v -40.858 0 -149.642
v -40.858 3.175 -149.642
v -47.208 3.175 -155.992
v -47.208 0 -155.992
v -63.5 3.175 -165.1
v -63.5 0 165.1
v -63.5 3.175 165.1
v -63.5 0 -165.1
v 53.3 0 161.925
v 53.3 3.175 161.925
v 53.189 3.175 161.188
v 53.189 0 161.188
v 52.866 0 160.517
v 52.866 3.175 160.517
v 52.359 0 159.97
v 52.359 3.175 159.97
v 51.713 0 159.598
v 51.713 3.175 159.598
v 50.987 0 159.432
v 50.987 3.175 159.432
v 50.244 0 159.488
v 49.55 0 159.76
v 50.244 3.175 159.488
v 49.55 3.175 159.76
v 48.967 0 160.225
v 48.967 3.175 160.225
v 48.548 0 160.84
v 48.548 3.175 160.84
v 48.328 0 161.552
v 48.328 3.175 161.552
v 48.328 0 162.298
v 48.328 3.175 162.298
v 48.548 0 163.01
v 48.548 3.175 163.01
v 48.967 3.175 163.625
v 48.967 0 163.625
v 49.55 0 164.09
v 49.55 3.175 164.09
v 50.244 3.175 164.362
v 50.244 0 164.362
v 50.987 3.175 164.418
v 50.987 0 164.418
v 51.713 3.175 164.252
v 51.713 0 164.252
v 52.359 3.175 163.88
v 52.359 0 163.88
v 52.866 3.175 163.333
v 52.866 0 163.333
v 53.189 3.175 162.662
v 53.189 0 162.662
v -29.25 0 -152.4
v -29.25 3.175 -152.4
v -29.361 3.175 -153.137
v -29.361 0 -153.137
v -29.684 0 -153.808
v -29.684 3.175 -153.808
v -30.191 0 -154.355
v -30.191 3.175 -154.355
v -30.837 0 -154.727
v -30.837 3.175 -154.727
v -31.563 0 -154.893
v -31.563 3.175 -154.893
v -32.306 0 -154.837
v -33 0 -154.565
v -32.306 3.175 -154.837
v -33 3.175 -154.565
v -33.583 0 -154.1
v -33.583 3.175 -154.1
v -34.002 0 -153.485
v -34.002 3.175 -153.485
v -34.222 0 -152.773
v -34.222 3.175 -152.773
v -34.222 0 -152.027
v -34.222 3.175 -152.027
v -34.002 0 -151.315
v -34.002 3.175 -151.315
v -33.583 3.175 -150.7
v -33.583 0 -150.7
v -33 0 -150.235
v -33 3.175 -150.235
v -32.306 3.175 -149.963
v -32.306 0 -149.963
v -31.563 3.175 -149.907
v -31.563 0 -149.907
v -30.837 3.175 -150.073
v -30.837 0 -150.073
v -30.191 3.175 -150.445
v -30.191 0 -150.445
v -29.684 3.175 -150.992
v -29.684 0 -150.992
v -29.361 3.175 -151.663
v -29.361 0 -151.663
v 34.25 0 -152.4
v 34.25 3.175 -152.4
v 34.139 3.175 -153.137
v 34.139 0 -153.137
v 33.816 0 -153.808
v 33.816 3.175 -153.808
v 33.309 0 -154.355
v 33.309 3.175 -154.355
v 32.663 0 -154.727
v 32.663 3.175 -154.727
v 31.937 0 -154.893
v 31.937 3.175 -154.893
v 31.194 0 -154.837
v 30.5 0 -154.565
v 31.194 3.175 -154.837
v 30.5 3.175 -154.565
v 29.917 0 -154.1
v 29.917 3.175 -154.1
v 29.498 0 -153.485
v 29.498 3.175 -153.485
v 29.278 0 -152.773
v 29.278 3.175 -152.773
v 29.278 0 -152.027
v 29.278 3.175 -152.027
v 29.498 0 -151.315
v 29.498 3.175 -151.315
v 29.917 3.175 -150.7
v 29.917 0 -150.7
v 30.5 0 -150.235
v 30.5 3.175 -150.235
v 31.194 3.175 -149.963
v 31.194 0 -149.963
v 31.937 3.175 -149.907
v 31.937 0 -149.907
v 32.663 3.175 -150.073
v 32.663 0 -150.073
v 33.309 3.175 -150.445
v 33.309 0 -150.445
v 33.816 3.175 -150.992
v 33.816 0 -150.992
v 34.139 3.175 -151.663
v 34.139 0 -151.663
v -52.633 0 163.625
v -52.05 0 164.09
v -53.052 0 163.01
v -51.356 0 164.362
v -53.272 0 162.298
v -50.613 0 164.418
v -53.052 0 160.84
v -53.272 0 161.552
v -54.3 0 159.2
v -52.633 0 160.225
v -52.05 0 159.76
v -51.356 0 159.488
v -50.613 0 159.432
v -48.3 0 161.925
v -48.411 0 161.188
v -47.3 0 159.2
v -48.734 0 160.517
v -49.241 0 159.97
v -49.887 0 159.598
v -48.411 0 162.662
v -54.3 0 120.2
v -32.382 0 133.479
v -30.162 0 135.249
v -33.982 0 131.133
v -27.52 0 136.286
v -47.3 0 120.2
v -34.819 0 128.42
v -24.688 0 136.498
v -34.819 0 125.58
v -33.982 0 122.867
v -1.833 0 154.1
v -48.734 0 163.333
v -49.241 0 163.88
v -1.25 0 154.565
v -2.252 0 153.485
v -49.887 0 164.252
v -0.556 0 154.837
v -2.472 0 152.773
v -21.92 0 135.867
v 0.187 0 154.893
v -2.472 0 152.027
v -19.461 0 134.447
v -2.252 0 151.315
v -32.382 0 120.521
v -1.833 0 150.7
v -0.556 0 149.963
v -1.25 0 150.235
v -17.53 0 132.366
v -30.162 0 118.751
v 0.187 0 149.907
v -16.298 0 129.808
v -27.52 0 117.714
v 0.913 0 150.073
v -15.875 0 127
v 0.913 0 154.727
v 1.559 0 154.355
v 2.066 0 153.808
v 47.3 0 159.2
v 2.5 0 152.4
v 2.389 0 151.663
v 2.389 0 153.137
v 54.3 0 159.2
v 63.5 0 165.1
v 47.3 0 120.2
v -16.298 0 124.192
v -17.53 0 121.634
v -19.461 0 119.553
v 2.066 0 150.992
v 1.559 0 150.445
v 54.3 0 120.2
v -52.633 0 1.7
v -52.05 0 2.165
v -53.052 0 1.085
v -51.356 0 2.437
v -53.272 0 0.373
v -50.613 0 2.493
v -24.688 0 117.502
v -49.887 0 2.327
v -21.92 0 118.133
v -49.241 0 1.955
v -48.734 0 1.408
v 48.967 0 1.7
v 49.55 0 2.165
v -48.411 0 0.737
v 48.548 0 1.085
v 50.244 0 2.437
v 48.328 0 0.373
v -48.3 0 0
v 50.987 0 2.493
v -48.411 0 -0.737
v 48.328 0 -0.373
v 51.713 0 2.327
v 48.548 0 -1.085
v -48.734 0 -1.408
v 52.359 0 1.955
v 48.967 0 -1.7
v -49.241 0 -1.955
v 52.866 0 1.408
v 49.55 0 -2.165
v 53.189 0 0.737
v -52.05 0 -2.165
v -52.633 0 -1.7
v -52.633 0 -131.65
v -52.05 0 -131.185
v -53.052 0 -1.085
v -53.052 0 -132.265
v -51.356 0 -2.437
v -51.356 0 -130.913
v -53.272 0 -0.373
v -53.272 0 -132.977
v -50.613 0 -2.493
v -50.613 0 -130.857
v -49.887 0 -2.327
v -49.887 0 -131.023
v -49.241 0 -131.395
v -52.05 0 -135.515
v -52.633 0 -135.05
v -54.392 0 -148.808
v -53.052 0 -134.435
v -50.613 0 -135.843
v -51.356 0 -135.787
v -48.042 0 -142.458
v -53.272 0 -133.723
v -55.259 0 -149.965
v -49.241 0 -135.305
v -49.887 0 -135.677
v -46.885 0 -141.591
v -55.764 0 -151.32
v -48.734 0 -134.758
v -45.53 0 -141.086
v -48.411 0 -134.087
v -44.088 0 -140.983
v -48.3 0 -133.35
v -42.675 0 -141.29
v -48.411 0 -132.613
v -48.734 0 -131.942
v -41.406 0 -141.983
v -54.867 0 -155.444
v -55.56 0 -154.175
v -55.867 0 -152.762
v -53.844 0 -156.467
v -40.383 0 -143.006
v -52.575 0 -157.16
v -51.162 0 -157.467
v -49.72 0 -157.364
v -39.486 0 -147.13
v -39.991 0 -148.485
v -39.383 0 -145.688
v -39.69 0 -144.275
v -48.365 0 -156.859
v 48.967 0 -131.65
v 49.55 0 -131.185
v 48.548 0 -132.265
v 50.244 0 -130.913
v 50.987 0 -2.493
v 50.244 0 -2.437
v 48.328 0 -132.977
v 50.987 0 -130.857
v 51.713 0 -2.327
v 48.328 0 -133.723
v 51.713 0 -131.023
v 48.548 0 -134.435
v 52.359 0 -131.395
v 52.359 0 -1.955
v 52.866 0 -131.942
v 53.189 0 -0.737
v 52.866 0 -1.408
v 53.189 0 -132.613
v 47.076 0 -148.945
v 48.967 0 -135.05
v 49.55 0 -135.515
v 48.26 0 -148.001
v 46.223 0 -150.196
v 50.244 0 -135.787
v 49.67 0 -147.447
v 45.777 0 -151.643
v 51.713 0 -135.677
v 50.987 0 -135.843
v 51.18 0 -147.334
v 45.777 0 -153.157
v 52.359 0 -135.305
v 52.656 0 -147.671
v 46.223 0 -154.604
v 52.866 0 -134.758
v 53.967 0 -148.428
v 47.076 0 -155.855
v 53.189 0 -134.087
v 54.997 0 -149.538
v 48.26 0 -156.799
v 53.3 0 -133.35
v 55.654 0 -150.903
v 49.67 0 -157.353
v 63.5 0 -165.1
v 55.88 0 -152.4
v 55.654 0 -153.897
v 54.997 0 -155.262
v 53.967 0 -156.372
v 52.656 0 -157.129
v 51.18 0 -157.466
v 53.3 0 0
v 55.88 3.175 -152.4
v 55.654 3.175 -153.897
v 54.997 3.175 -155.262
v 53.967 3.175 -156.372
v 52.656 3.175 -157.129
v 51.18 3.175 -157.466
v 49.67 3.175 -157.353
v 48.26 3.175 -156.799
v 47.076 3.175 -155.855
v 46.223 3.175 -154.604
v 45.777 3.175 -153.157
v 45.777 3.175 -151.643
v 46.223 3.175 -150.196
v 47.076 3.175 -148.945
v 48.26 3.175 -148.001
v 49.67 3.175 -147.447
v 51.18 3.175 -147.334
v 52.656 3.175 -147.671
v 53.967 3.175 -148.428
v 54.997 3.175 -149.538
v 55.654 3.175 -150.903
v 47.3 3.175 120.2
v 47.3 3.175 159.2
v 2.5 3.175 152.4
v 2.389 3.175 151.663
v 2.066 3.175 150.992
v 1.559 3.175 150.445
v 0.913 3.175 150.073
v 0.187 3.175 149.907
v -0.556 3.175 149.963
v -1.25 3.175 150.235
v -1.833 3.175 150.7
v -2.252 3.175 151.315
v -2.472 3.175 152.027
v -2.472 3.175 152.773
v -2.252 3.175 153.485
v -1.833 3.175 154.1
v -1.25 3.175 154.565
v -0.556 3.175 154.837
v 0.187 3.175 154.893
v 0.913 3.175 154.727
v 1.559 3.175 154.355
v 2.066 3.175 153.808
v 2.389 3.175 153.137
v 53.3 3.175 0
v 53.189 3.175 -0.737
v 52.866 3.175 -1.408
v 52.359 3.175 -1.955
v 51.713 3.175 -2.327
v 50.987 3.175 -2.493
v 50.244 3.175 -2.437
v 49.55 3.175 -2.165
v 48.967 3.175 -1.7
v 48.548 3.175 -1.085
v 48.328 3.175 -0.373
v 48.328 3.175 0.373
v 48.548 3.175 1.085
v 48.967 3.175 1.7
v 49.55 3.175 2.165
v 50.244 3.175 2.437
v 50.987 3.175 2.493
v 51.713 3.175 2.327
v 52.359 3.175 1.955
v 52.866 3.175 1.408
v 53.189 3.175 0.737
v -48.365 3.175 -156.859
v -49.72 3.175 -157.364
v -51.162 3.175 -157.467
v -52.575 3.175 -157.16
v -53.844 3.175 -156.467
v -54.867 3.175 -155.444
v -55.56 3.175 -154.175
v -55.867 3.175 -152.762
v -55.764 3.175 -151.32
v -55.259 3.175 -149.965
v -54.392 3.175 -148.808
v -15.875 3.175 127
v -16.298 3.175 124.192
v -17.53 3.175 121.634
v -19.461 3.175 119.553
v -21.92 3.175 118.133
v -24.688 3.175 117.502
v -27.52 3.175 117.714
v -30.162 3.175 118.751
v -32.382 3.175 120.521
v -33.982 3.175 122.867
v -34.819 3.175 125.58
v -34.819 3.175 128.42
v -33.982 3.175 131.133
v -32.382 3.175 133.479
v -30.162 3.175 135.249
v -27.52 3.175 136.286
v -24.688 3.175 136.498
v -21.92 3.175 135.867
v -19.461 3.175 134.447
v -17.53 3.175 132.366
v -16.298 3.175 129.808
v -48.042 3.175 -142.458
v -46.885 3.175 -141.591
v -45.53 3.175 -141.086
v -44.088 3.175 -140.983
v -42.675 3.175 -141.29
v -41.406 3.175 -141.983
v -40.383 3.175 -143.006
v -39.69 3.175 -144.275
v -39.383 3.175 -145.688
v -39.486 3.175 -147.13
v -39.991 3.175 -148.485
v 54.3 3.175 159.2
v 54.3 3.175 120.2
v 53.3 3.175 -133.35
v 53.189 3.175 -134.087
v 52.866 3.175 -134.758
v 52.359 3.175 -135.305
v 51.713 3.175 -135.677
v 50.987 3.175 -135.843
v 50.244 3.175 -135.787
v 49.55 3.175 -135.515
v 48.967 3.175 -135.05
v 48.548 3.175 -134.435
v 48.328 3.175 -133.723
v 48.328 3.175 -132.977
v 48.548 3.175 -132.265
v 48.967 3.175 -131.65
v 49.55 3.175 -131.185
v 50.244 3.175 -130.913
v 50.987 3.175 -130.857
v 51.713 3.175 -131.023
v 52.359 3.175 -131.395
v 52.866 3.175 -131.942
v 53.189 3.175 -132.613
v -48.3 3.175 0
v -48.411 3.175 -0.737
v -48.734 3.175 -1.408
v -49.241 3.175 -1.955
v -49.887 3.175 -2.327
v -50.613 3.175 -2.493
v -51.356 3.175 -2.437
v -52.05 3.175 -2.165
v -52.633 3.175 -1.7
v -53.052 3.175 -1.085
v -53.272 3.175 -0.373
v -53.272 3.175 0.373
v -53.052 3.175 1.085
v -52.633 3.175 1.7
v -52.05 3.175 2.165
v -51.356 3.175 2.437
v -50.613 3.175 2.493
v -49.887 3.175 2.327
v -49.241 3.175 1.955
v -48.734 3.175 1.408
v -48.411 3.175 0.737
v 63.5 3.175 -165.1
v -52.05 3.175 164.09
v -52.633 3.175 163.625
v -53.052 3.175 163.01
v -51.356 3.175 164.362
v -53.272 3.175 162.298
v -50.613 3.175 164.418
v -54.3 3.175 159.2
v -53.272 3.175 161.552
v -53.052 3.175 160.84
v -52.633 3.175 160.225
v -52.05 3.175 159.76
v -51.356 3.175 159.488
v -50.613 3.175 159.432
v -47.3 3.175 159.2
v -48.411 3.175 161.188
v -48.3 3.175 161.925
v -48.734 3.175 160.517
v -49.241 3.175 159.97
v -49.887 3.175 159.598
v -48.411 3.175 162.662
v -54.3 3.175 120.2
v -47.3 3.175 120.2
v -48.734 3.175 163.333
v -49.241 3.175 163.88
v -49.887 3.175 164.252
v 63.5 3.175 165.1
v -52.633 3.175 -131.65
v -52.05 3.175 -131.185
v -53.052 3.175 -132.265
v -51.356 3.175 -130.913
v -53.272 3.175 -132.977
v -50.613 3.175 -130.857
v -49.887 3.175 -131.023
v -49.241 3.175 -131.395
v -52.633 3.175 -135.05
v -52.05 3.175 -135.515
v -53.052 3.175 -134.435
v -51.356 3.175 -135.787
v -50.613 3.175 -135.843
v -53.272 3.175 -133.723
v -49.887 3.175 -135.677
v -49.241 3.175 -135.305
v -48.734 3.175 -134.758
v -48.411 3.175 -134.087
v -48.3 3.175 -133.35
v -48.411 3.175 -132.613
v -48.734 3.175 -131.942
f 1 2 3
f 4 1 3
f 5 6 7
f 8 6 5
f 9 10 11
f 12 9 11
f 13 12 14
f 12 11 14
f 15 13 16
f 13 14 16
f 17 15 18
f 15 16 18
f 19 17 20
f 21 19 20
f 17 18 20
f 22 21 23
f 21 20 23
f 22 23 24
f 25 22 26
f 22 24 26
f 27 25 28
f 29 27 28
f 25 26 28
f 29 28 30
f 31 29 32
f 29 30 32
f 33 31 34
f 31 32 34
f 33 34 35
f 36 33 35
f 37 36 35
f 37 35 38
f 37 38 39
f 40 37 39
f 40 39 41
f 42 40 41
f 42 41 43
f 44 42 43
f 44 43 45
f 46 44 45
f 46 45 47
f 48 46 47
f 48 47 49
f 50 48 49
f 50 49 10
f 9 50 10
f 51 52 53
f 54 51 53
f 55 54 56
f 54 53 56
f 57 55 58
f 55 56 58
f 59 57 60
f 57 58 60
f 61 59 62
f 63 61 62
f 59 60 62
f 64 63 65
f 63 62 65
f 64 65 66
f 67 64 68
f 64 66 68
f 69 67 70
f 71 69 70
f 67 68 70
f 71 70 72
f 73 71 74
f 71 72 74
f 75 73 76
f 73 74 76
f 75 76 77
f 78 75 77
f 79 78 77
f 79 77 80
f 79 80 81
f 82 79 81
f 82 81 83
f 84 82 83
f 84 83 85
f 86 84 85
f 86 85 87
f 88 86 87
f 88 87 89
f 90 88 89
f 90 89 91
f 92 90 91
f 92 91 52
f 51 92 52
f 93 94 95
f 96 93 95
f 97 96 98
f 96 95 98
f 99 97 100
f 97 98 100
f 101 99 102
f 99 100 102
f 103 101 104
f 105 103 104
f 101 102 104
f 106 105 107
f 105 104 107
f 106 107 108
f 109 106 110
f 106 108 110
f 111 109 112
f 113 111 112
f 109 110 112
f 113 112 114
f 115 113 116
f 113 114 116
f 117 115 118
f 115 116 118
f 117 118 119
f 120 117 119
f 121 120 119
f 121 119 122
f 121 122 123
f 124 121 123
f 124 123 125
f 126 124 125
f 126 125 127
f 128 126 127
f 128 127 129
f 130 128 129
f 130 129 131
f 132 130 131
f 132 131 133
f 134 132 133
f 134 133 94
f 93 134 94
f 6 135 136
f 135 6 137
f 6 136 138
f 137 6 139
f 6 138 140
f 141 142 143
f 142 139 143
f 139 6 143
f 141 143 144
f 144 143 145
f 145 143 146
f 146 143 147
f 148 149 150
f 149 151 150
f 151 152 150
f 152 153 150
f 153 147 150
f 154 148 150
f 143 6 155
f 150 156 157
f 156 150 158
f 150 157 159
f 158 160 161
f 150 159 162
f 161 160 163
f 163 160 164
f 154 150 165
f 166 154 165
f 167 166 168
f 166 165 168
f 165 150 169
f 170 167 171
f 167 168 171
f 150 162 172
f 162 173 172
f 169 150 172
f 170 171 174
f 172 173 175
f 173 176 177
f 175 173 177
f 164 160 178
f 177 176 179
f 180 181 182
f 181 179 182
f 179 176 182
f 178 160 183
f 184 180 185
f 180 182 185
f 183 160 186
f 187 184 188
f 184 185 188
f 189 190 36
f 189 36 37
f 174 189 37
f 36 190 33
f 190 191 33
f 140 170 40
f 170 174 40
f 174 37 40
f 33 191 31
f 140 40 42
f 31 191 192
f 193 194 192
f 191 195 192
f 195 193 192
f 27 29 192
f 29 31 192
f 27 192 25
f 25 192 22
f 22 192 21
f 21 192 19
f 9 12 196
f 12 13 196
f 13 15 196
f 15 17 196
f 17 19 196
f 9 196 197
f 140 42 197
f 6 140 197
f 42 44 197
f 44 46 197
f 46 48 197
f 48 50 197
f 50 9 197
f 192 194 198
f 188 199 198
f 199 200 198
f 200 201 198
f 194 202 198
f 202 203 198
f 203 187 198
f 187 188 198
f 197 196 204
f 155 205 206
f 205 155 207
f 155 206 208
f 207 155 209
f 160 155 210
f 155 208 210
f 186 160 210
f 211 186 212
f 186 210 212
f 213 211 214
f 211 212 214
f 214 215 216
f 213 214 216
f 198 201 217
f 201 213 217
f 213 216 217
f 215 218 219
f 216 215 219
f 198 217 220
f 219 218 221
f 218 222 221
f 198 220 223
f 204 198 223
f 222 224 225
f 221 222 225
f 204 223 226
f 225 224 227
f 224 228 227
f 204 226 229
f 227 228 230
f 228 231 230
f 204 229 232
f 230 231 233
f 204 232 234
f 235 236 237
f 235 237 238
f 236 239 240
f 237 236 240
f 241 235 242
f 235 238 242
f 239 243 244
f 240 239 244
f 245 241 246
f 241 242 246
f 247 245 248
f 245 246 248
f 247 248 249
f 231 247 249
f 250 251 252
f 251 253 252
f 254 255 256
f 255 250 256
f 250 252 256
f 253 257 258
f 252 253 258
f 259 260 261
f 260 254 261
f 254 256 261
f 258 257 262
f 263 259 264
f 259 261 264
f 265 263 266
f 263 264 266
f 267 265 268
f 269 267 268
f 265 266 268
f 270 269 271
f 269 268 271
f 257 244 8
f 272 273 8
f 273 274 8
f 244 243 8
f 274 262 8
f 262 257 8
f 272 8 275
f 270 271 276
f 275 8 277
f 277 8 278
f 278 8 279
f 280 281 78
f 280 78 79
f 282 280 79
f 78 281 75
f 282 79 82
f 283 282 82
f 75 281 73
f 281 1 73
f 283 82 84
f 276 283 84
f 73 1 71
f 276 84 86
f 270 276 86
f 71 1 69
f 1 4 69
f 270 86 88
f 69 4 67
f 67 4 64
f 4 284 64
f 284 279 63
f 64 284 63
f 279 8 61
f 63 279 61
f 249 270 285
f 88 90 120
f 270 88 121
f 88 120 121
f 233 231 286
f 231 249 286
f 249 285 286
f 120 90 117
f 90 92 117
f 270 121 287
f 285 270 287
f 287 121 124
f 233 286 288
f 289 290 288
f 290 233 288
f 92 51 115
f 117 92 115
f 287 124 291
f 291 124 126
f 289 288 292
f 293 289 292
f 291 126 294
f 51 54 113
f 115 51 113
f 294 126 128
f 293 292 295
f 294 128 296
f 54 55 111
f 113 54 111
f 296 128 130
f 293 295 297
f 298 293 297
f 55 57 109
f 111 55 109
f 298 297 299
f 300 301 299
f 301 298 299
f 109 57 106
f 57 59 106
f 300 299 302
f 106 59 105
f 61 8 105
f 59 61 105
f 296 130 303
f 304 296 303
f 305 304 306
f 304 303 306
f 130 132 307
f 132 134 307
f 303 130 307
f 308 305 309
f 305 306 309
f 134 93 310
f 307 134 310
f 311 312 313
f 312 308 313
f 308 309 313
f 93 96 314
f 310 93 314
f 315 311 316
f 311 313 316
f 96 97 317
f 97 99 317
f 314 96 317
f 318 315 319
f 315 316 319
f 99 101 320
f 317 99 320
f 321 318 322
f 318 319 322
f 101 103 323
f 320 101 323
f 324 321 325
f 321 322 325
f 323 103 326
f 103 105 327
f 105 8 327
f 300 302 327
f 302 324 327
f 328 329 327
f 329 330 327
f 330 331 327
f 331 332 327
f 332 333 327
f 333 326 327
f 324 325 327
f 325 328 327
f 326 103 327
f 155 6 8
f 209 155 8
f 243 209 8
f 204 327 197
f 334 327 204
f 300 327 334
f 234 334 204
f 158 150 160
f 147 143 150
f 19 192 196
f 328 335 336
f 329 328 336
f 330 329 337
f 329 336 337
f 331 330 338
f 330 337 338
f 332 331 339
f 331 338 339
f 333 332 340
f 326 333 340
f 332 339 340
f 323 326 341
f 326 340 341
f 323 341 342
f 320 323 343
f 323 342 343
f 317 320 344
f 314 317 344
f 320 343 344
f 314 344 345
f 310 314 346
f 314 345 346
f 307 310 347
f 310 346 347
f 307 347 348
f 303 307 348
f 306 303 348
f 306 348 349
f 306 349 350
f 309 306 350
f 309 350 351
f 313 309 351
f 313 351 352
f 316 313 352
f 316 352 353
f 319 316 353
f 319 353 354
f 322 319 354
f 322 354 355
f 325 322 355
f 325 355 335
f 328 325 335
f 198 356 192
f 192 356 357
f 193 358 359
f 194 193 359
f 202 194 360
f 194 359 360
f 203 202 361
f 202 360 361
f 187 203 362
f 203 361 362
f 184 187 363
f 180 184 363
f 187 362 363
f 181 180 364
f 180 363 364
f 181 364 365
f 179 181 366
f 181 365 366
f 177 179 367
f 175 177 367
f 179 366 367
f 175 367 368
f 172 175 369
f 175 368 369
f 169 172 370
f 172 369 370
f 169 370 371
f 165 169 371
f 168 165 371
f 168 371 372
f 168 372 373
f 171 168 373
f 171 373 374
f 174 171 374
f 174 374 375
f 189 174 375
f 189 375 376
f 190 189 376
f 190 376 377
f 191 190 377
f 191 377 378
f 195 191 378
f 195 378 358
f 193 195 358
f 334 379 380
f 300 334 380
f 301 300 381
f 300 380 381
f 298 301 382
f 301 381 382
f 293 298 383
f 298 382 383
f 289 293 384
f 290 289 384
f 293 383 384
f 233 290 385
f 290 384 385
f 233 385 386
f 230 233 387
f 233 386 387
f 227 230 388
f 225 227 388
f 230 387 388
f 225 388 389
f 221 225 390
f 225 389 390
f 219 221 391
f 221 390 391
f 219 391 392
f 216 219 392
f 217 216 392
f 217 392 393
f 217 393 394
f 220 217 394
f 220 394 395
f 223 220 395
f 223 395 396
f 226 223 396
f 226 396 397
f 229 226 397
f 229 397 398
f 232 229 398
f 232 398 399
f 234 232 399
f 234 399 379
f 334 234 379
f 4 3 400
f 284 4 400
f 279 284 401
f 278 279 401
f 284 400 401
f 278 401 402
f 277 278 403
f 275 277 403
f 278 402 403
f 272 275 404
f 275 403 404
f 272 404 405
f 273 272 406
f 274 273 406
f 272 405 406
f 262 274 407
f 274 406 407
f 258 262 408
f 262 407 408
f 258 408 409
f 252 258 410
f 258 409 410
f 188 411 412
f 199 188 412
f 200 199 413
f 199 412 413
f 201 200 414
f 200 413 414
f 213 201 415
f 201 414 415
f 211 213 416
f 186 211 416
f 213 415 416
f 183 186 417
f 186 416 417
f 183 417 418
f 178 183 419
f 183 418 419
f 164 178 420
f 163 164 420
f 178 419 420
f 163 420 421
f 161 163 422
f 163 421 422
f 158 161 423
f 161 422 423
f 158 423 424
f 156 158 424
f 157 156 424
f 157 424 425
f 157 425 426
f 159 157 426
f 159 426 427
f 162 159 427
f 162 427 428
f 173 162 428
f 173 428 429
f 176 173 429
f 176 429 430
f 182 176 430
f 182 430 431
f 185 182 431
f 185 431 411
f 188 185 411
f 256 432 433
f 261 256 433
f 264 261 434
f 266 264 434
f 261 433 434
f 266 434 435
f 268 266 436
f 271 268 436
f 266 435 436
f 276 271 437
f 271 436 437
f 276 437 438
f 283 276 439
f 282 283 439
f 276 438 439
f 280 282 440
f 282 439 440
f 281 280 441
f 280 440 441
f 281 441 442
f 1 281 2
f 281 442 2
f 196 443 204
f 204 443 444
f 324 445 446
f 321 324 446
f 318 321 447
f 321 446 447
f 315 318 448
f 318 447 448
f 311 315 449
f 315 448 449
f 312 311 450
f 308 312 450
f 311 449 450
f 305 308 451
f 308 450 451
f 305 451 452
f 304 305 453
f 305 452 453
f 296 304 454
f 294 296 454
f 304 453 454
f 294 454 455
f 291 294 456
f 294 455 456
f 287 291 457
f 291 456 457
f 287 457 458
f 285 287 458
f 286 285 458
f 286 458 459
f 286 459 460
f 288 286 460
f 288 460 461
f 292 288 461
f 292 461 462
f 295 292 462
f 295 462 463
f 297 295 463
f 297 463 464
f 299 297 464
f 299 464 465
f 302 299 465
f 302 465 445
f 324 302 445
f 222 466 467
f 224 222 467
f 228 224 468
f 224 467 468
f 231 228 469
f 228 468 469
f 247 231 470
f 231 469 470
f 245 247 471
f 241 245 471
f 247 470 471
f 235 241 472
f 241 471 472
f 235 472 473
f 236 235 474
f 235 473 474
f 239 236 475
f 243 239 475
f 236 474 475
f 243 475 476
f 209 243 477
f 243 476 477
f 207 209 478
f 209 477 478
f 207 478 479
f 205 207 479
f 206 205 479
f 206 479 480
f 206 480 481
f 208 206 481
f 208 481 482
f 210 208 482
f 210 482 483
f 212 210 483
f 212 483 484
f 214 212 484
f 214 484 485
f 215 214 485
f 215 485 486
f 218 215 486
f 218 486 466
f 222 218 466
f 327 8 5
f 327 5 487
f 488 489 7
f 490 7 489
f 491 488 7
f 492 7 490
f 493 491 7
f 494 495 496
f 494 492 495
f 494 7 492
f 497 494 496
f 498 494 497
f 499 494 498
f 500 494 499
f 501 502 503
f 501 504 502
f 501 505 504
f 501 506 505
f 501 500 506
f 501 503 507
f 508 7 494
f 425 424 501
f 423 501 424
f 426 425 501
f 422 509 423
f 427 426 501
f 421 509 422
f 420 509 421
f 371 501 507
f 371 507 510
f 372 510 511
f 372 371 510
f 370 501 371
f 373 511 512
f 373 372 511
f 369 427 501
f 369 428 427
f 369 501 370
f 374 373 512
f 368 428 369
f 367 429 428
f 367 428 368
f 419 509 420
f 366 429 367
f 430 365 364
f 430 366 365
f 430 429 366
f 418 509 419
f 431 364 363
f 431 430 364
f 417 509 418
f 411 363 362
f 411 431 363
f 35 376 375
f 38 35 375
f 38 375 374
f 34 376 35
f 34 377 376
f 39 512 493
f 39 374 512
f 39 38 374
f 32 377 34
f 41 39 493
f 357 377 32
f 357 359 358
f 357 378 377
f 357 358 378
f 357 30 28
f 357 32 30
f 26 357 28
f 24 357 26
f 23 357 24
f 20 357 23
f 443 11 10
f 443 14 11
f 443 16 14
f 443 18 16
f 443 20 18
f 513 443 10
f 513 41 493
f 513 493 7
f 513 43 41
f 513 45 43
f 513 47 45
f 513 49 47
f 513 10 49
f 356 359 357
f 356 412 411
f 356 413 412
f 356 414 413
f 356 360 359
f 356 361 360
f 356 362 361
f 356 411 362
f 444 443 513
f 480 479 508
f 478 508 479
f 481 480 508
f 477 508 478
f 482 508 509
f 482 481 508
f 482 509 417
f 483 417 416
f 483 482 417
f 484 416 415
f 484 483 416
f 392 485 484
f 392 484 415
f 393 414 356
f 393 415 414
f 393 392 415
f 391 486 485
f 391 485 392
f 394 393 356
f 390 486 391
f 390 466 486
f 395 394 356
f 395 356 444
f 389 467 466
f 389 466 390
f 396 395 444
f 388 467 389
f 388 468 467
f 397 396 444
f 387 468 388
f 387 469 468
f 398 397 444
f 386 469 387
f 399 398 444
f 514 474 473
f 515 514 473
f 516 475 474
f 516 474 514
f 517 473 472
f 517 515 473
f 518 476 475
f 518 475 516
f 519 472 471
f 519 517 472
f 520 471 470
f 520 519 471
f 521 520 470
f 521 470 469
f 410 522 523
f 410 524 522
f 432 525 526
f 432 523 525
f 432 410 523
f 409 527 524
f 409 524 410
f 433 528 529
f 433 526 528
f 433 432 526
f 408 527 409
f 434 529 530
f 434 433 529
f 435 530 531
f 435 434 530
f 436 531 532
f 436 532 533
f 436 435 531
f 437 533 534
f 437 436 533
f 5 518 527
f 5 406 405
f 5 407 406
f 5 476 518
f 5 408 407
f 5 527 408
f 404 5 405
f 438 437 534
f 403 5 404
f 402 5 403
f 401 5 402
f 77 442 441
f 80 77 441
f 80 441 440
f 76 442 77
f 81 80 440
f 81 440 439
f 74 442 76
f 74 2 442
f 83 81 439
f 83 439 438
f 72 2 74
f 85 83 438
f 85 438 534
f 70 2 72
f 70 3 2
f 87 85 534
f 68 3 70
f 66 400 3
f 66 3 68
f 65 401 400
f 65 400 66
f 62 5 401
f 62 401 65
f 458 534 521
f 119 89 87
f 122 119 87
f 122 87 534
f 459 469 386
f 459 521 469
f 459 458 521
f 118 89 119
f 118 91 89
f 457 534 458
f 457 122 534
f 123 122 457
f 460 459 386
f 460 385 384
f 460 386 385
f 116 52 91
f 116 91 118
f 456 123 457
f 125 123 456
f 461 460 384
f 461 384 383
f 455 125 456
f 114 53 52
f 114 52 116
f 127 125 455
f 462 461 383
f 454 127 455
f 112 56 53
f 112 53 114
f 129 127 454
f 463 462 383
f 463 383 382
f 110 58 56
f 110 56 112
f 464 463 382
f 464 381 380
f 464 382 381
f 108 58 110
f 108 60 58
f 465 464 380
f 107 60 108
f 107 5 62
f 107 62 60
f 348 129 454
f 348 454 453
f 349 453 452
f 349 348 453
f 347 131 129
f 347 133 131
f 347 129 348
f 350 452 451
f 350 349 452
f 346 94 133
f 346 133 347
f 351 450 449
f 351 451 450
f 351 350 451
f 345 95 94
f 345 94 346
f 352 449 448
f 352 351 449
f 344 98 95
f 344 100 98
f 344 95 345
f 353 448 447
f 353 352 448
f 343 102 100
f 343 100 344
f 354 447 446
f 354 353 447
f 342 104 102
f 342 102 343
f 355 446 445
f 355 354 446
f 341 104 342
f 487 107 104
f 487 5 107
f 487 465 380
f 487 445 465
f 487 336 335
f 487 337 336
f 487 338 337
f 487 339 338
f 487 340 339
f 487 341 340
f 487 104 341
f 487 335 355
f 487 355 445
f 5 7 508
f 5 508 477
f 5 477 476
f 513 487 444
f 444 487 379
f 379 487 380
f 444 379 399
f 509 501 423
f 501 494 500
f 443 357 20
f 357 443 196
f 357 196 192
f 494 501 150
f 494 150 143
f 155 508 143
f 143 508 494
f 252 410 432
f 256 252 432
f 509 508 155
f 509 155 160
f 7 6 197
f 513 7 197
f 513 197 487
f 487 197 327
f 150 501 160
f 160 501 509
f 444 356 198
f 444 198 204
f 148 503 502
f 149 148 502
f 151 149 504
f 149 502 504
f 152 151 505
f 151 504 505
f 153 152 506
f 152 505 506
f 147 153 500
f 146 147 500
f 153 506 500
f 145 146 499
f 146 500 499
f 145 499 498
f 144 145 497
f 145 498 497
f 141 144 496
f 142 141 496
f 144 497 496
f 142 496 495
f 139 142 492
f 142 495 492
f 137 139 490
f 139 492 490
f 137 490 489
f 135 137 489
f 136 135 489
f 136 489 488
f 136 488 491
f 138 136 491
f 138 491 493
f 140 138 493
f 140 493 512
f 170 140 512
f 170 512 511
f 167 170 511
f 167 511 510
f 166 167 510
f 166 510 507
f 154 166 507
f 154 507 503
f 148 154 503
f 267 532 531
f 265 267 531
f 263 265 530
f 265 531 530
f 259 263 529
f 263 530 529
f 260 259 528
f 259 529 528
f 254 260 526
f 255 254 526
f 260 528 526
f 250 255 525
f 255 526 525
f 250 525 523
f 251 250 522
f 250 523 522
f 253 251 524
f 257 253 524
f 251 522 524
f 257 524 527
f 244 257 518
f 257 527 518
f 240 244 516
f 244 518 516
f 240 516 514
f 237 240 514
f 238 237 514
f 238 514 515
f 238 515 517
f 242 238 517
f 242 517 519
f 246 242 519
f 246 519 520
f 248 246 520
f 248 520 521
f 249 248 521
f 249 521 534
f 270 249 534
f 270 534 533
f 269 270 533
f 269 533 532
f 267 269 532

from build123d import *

# Parameters (mm, degrees)
SKETCH1_W           = 127
SKETCH1_H           = 330.2
BOSS_EXTRUDE1_DEPTH = 3.175
SKETCH2_R           = 2.5
SKETCH2_R_2         = 5.08
CUT_EXTRUDE1_DEPTH  = 25.4
SKETCH3_W           = 7
SKETCH3_H           = 39
SKETCH3_R           = 9.525
CUT_EXTRUDE2_DEPTH  = 25.4


with BuildPart() as part:
    # Sketch1 → Boss-Extrude1 (new body)
    with BuildSketch(Plane(origin=(0, 0, 0), x_dir=(1, 0, 0), z_dir=(0, 1, 0))):
        Rectangle(SKETCH1_W, SKETCH1_H)
    extrude(amount=BOSS_EXTRUDE1_DEPTH)

    # Sketch2 → Cut-Extrude1 (cut)
    # profile 1 of 14: a face of its own
    with BuildSketch(Plane(origin=(0, 3.175, 0), x_dir=(1, 0, 0), z_dir=(0, 1, 0))):
        with BuildLine():
            Line((-47.207897552, 155.992102448), (-40.857897552, 149.642102448))
            ThreePointArc((-40.857897552, 149.642102448), (-40.857897552, 142.457897552), (-48.042102448, 142.457897552))
            Line((-48.042102448, 142.457897552), (-54.392102448, 148.807897552))
            ThreePointArc((-54.392102448, 148.807897552), (-54.392102448, 155.992102448), (-47.207897552, 155.992102448))
        make_face()
        with Locations((-44.45, 146.05)):
            Circle(SKETCH2_R, mode=Mode.SUBTRACT)
        with Locations((-50.8, 152.4)):
            Circle(SKETCH2_R, mode=Mode.SUBTRACT)
    # profile 2 of 14: a face of its own
    with BuildSketch(Plane(origin=(0, 3.175, 0), x_dir=(1, 0, 0), z_dir=(0, 1, 0))):
        with Locations((-44.45, 146.05)):
            Circle(SKETCH2_R)
    # profile 3 of 14: a face of its own
    with BuildSketch(Plane(origin=(0, 3.175, 0), x_dir=(1, 0, 0), z_dir=(0, 1, 0))):
        with Locations((-50.8, 152.4)):
            Circle(SKETCH2_R)
    # profile 4 of 14: a face of its own
    with BuildSketch(Plane(origin=(0, 3.175, 0), x_dir=(1, 0, 0), z_dir=(0, 1, 0))):
        with Locations((50.8, 152.4)):
            Circle(SKETCH2_R_2)
        with Locations((50.8, 152.4)):
            Circle(SKETCH2_R, mode=Mode.SUBTRACT)
    # profile 5 of 14: a face of its own
    with BuildSketch(Plane(origin=(0, 3.175, 0), x_dir=(1, 0, 0), z_dir=(0, 1, 0))):
        with Locations((50.8, 152.4)):
            Circle(SKETCH2_R)
    # profile 6 of 14: a face of its own
    with BuildSketch(Plane(origin=(0, 3.175, 0), x_dir=(1, 0, 0), z_dir=(0, 1, 0))):
        with Locations((-31.75, 152.4)):
            Circle(SKETCH2_R)
    # profile 7 of 14: a face of its own
    with BuildSketch(Plane(origin=(0, 3.175, 0), x_dir=(1, 0, 0), z_dir=(0, 1, 0))):
        with Locations((31.75, 152.4)):
            Circle(SKETCH2_R)
    # profile 8 of 14: a face of its own
    with BuildSketch(Plane(origin=(0, 3.175, 0), x_dir=(1, 0, 0), z_dir=(0, 1, 0))):
        with Locations((-50.8, 133.35)):
            Circle(SKETCH2_R)
    # profile 9 of 14: a face of its own
    with BuildSketch(Plane(origin=(0, 3.175, 0), x_dir=(1, 0, 0), z_dir=(0, 1, 0))):
        with Locations((50.8, 133.35)):
            Circle(SKETCH2_R)
    # profile 10 of 14: a face of its own
    with BuildSketch(Plane(origin=(0, 3.175, 0), x_dir=(1, 0, 0), z_dir=(0, 1, 0))):
        with Locations((-50.8, -161.925)):
            Circle(SKETCH2_R)
    # profile 11 of 14: a face of its own
    with BuildSketch(Plane(origin=(0, 3.175, 0), x_dir=(1, 0, 0), z_dir=(0, 1, 0))):
        with Locations((50.8, -161.925)):
            Circle(SKETCH2_R)
    # profile 12 of 14: a face of its own
    with BuildSketch(Plane(origin=(0, 3.175, 0), x_dir=(1, 0, 0), z_dir=(0, 1, 0))):
        with Locations((-50.8, 0)):
            Circle(SKETCH2_R)
    # profile 13 of 14: a face of its own
    with BuildSketch(Plane(origin=(0, 3.175, 0), x_dir=(1, 0, 0), z_dir=(0, 1, 0))):
        with Locations((50.8, 0)):
            Circle(SKETCH2_R)
    # profile 14 of 14: a face of its own
    with BuildSketch(Plane(origin=(0, 3.175, 0), x_dir=(1, 0, 0), z_dir=(0, 1, 0))):
        with Locations((0, -152.4)):
            Circle(SKETCH2_R)
    extrude(amount=-CUT_EXTRUDE1_DEPTH, mode=Mode.SUBTRACT)

    # Sketch3 → Cut-Extrude2 (cut)
    with BuildSketch(Plane(origin=(0, 3.175, 0), x_dir=(1, 0, 0), z_dir=(0, 1, 0))):
        with Locations((-50.8, -139.7)):
            Rectangle(SKETCH3_W, SKETCH3_H)
        with Locations((50.8, -139.7)):
            Rectangle(SKETCH3_W, SKETCH3_H)
        with Locations((-25.4, -127)):
            Circle(SKETCH3_R)
    extrude(amount=-CUT_EXTRUDE2_DEPTH, mode=Mode.SUBTRACT)


solid = part.part
